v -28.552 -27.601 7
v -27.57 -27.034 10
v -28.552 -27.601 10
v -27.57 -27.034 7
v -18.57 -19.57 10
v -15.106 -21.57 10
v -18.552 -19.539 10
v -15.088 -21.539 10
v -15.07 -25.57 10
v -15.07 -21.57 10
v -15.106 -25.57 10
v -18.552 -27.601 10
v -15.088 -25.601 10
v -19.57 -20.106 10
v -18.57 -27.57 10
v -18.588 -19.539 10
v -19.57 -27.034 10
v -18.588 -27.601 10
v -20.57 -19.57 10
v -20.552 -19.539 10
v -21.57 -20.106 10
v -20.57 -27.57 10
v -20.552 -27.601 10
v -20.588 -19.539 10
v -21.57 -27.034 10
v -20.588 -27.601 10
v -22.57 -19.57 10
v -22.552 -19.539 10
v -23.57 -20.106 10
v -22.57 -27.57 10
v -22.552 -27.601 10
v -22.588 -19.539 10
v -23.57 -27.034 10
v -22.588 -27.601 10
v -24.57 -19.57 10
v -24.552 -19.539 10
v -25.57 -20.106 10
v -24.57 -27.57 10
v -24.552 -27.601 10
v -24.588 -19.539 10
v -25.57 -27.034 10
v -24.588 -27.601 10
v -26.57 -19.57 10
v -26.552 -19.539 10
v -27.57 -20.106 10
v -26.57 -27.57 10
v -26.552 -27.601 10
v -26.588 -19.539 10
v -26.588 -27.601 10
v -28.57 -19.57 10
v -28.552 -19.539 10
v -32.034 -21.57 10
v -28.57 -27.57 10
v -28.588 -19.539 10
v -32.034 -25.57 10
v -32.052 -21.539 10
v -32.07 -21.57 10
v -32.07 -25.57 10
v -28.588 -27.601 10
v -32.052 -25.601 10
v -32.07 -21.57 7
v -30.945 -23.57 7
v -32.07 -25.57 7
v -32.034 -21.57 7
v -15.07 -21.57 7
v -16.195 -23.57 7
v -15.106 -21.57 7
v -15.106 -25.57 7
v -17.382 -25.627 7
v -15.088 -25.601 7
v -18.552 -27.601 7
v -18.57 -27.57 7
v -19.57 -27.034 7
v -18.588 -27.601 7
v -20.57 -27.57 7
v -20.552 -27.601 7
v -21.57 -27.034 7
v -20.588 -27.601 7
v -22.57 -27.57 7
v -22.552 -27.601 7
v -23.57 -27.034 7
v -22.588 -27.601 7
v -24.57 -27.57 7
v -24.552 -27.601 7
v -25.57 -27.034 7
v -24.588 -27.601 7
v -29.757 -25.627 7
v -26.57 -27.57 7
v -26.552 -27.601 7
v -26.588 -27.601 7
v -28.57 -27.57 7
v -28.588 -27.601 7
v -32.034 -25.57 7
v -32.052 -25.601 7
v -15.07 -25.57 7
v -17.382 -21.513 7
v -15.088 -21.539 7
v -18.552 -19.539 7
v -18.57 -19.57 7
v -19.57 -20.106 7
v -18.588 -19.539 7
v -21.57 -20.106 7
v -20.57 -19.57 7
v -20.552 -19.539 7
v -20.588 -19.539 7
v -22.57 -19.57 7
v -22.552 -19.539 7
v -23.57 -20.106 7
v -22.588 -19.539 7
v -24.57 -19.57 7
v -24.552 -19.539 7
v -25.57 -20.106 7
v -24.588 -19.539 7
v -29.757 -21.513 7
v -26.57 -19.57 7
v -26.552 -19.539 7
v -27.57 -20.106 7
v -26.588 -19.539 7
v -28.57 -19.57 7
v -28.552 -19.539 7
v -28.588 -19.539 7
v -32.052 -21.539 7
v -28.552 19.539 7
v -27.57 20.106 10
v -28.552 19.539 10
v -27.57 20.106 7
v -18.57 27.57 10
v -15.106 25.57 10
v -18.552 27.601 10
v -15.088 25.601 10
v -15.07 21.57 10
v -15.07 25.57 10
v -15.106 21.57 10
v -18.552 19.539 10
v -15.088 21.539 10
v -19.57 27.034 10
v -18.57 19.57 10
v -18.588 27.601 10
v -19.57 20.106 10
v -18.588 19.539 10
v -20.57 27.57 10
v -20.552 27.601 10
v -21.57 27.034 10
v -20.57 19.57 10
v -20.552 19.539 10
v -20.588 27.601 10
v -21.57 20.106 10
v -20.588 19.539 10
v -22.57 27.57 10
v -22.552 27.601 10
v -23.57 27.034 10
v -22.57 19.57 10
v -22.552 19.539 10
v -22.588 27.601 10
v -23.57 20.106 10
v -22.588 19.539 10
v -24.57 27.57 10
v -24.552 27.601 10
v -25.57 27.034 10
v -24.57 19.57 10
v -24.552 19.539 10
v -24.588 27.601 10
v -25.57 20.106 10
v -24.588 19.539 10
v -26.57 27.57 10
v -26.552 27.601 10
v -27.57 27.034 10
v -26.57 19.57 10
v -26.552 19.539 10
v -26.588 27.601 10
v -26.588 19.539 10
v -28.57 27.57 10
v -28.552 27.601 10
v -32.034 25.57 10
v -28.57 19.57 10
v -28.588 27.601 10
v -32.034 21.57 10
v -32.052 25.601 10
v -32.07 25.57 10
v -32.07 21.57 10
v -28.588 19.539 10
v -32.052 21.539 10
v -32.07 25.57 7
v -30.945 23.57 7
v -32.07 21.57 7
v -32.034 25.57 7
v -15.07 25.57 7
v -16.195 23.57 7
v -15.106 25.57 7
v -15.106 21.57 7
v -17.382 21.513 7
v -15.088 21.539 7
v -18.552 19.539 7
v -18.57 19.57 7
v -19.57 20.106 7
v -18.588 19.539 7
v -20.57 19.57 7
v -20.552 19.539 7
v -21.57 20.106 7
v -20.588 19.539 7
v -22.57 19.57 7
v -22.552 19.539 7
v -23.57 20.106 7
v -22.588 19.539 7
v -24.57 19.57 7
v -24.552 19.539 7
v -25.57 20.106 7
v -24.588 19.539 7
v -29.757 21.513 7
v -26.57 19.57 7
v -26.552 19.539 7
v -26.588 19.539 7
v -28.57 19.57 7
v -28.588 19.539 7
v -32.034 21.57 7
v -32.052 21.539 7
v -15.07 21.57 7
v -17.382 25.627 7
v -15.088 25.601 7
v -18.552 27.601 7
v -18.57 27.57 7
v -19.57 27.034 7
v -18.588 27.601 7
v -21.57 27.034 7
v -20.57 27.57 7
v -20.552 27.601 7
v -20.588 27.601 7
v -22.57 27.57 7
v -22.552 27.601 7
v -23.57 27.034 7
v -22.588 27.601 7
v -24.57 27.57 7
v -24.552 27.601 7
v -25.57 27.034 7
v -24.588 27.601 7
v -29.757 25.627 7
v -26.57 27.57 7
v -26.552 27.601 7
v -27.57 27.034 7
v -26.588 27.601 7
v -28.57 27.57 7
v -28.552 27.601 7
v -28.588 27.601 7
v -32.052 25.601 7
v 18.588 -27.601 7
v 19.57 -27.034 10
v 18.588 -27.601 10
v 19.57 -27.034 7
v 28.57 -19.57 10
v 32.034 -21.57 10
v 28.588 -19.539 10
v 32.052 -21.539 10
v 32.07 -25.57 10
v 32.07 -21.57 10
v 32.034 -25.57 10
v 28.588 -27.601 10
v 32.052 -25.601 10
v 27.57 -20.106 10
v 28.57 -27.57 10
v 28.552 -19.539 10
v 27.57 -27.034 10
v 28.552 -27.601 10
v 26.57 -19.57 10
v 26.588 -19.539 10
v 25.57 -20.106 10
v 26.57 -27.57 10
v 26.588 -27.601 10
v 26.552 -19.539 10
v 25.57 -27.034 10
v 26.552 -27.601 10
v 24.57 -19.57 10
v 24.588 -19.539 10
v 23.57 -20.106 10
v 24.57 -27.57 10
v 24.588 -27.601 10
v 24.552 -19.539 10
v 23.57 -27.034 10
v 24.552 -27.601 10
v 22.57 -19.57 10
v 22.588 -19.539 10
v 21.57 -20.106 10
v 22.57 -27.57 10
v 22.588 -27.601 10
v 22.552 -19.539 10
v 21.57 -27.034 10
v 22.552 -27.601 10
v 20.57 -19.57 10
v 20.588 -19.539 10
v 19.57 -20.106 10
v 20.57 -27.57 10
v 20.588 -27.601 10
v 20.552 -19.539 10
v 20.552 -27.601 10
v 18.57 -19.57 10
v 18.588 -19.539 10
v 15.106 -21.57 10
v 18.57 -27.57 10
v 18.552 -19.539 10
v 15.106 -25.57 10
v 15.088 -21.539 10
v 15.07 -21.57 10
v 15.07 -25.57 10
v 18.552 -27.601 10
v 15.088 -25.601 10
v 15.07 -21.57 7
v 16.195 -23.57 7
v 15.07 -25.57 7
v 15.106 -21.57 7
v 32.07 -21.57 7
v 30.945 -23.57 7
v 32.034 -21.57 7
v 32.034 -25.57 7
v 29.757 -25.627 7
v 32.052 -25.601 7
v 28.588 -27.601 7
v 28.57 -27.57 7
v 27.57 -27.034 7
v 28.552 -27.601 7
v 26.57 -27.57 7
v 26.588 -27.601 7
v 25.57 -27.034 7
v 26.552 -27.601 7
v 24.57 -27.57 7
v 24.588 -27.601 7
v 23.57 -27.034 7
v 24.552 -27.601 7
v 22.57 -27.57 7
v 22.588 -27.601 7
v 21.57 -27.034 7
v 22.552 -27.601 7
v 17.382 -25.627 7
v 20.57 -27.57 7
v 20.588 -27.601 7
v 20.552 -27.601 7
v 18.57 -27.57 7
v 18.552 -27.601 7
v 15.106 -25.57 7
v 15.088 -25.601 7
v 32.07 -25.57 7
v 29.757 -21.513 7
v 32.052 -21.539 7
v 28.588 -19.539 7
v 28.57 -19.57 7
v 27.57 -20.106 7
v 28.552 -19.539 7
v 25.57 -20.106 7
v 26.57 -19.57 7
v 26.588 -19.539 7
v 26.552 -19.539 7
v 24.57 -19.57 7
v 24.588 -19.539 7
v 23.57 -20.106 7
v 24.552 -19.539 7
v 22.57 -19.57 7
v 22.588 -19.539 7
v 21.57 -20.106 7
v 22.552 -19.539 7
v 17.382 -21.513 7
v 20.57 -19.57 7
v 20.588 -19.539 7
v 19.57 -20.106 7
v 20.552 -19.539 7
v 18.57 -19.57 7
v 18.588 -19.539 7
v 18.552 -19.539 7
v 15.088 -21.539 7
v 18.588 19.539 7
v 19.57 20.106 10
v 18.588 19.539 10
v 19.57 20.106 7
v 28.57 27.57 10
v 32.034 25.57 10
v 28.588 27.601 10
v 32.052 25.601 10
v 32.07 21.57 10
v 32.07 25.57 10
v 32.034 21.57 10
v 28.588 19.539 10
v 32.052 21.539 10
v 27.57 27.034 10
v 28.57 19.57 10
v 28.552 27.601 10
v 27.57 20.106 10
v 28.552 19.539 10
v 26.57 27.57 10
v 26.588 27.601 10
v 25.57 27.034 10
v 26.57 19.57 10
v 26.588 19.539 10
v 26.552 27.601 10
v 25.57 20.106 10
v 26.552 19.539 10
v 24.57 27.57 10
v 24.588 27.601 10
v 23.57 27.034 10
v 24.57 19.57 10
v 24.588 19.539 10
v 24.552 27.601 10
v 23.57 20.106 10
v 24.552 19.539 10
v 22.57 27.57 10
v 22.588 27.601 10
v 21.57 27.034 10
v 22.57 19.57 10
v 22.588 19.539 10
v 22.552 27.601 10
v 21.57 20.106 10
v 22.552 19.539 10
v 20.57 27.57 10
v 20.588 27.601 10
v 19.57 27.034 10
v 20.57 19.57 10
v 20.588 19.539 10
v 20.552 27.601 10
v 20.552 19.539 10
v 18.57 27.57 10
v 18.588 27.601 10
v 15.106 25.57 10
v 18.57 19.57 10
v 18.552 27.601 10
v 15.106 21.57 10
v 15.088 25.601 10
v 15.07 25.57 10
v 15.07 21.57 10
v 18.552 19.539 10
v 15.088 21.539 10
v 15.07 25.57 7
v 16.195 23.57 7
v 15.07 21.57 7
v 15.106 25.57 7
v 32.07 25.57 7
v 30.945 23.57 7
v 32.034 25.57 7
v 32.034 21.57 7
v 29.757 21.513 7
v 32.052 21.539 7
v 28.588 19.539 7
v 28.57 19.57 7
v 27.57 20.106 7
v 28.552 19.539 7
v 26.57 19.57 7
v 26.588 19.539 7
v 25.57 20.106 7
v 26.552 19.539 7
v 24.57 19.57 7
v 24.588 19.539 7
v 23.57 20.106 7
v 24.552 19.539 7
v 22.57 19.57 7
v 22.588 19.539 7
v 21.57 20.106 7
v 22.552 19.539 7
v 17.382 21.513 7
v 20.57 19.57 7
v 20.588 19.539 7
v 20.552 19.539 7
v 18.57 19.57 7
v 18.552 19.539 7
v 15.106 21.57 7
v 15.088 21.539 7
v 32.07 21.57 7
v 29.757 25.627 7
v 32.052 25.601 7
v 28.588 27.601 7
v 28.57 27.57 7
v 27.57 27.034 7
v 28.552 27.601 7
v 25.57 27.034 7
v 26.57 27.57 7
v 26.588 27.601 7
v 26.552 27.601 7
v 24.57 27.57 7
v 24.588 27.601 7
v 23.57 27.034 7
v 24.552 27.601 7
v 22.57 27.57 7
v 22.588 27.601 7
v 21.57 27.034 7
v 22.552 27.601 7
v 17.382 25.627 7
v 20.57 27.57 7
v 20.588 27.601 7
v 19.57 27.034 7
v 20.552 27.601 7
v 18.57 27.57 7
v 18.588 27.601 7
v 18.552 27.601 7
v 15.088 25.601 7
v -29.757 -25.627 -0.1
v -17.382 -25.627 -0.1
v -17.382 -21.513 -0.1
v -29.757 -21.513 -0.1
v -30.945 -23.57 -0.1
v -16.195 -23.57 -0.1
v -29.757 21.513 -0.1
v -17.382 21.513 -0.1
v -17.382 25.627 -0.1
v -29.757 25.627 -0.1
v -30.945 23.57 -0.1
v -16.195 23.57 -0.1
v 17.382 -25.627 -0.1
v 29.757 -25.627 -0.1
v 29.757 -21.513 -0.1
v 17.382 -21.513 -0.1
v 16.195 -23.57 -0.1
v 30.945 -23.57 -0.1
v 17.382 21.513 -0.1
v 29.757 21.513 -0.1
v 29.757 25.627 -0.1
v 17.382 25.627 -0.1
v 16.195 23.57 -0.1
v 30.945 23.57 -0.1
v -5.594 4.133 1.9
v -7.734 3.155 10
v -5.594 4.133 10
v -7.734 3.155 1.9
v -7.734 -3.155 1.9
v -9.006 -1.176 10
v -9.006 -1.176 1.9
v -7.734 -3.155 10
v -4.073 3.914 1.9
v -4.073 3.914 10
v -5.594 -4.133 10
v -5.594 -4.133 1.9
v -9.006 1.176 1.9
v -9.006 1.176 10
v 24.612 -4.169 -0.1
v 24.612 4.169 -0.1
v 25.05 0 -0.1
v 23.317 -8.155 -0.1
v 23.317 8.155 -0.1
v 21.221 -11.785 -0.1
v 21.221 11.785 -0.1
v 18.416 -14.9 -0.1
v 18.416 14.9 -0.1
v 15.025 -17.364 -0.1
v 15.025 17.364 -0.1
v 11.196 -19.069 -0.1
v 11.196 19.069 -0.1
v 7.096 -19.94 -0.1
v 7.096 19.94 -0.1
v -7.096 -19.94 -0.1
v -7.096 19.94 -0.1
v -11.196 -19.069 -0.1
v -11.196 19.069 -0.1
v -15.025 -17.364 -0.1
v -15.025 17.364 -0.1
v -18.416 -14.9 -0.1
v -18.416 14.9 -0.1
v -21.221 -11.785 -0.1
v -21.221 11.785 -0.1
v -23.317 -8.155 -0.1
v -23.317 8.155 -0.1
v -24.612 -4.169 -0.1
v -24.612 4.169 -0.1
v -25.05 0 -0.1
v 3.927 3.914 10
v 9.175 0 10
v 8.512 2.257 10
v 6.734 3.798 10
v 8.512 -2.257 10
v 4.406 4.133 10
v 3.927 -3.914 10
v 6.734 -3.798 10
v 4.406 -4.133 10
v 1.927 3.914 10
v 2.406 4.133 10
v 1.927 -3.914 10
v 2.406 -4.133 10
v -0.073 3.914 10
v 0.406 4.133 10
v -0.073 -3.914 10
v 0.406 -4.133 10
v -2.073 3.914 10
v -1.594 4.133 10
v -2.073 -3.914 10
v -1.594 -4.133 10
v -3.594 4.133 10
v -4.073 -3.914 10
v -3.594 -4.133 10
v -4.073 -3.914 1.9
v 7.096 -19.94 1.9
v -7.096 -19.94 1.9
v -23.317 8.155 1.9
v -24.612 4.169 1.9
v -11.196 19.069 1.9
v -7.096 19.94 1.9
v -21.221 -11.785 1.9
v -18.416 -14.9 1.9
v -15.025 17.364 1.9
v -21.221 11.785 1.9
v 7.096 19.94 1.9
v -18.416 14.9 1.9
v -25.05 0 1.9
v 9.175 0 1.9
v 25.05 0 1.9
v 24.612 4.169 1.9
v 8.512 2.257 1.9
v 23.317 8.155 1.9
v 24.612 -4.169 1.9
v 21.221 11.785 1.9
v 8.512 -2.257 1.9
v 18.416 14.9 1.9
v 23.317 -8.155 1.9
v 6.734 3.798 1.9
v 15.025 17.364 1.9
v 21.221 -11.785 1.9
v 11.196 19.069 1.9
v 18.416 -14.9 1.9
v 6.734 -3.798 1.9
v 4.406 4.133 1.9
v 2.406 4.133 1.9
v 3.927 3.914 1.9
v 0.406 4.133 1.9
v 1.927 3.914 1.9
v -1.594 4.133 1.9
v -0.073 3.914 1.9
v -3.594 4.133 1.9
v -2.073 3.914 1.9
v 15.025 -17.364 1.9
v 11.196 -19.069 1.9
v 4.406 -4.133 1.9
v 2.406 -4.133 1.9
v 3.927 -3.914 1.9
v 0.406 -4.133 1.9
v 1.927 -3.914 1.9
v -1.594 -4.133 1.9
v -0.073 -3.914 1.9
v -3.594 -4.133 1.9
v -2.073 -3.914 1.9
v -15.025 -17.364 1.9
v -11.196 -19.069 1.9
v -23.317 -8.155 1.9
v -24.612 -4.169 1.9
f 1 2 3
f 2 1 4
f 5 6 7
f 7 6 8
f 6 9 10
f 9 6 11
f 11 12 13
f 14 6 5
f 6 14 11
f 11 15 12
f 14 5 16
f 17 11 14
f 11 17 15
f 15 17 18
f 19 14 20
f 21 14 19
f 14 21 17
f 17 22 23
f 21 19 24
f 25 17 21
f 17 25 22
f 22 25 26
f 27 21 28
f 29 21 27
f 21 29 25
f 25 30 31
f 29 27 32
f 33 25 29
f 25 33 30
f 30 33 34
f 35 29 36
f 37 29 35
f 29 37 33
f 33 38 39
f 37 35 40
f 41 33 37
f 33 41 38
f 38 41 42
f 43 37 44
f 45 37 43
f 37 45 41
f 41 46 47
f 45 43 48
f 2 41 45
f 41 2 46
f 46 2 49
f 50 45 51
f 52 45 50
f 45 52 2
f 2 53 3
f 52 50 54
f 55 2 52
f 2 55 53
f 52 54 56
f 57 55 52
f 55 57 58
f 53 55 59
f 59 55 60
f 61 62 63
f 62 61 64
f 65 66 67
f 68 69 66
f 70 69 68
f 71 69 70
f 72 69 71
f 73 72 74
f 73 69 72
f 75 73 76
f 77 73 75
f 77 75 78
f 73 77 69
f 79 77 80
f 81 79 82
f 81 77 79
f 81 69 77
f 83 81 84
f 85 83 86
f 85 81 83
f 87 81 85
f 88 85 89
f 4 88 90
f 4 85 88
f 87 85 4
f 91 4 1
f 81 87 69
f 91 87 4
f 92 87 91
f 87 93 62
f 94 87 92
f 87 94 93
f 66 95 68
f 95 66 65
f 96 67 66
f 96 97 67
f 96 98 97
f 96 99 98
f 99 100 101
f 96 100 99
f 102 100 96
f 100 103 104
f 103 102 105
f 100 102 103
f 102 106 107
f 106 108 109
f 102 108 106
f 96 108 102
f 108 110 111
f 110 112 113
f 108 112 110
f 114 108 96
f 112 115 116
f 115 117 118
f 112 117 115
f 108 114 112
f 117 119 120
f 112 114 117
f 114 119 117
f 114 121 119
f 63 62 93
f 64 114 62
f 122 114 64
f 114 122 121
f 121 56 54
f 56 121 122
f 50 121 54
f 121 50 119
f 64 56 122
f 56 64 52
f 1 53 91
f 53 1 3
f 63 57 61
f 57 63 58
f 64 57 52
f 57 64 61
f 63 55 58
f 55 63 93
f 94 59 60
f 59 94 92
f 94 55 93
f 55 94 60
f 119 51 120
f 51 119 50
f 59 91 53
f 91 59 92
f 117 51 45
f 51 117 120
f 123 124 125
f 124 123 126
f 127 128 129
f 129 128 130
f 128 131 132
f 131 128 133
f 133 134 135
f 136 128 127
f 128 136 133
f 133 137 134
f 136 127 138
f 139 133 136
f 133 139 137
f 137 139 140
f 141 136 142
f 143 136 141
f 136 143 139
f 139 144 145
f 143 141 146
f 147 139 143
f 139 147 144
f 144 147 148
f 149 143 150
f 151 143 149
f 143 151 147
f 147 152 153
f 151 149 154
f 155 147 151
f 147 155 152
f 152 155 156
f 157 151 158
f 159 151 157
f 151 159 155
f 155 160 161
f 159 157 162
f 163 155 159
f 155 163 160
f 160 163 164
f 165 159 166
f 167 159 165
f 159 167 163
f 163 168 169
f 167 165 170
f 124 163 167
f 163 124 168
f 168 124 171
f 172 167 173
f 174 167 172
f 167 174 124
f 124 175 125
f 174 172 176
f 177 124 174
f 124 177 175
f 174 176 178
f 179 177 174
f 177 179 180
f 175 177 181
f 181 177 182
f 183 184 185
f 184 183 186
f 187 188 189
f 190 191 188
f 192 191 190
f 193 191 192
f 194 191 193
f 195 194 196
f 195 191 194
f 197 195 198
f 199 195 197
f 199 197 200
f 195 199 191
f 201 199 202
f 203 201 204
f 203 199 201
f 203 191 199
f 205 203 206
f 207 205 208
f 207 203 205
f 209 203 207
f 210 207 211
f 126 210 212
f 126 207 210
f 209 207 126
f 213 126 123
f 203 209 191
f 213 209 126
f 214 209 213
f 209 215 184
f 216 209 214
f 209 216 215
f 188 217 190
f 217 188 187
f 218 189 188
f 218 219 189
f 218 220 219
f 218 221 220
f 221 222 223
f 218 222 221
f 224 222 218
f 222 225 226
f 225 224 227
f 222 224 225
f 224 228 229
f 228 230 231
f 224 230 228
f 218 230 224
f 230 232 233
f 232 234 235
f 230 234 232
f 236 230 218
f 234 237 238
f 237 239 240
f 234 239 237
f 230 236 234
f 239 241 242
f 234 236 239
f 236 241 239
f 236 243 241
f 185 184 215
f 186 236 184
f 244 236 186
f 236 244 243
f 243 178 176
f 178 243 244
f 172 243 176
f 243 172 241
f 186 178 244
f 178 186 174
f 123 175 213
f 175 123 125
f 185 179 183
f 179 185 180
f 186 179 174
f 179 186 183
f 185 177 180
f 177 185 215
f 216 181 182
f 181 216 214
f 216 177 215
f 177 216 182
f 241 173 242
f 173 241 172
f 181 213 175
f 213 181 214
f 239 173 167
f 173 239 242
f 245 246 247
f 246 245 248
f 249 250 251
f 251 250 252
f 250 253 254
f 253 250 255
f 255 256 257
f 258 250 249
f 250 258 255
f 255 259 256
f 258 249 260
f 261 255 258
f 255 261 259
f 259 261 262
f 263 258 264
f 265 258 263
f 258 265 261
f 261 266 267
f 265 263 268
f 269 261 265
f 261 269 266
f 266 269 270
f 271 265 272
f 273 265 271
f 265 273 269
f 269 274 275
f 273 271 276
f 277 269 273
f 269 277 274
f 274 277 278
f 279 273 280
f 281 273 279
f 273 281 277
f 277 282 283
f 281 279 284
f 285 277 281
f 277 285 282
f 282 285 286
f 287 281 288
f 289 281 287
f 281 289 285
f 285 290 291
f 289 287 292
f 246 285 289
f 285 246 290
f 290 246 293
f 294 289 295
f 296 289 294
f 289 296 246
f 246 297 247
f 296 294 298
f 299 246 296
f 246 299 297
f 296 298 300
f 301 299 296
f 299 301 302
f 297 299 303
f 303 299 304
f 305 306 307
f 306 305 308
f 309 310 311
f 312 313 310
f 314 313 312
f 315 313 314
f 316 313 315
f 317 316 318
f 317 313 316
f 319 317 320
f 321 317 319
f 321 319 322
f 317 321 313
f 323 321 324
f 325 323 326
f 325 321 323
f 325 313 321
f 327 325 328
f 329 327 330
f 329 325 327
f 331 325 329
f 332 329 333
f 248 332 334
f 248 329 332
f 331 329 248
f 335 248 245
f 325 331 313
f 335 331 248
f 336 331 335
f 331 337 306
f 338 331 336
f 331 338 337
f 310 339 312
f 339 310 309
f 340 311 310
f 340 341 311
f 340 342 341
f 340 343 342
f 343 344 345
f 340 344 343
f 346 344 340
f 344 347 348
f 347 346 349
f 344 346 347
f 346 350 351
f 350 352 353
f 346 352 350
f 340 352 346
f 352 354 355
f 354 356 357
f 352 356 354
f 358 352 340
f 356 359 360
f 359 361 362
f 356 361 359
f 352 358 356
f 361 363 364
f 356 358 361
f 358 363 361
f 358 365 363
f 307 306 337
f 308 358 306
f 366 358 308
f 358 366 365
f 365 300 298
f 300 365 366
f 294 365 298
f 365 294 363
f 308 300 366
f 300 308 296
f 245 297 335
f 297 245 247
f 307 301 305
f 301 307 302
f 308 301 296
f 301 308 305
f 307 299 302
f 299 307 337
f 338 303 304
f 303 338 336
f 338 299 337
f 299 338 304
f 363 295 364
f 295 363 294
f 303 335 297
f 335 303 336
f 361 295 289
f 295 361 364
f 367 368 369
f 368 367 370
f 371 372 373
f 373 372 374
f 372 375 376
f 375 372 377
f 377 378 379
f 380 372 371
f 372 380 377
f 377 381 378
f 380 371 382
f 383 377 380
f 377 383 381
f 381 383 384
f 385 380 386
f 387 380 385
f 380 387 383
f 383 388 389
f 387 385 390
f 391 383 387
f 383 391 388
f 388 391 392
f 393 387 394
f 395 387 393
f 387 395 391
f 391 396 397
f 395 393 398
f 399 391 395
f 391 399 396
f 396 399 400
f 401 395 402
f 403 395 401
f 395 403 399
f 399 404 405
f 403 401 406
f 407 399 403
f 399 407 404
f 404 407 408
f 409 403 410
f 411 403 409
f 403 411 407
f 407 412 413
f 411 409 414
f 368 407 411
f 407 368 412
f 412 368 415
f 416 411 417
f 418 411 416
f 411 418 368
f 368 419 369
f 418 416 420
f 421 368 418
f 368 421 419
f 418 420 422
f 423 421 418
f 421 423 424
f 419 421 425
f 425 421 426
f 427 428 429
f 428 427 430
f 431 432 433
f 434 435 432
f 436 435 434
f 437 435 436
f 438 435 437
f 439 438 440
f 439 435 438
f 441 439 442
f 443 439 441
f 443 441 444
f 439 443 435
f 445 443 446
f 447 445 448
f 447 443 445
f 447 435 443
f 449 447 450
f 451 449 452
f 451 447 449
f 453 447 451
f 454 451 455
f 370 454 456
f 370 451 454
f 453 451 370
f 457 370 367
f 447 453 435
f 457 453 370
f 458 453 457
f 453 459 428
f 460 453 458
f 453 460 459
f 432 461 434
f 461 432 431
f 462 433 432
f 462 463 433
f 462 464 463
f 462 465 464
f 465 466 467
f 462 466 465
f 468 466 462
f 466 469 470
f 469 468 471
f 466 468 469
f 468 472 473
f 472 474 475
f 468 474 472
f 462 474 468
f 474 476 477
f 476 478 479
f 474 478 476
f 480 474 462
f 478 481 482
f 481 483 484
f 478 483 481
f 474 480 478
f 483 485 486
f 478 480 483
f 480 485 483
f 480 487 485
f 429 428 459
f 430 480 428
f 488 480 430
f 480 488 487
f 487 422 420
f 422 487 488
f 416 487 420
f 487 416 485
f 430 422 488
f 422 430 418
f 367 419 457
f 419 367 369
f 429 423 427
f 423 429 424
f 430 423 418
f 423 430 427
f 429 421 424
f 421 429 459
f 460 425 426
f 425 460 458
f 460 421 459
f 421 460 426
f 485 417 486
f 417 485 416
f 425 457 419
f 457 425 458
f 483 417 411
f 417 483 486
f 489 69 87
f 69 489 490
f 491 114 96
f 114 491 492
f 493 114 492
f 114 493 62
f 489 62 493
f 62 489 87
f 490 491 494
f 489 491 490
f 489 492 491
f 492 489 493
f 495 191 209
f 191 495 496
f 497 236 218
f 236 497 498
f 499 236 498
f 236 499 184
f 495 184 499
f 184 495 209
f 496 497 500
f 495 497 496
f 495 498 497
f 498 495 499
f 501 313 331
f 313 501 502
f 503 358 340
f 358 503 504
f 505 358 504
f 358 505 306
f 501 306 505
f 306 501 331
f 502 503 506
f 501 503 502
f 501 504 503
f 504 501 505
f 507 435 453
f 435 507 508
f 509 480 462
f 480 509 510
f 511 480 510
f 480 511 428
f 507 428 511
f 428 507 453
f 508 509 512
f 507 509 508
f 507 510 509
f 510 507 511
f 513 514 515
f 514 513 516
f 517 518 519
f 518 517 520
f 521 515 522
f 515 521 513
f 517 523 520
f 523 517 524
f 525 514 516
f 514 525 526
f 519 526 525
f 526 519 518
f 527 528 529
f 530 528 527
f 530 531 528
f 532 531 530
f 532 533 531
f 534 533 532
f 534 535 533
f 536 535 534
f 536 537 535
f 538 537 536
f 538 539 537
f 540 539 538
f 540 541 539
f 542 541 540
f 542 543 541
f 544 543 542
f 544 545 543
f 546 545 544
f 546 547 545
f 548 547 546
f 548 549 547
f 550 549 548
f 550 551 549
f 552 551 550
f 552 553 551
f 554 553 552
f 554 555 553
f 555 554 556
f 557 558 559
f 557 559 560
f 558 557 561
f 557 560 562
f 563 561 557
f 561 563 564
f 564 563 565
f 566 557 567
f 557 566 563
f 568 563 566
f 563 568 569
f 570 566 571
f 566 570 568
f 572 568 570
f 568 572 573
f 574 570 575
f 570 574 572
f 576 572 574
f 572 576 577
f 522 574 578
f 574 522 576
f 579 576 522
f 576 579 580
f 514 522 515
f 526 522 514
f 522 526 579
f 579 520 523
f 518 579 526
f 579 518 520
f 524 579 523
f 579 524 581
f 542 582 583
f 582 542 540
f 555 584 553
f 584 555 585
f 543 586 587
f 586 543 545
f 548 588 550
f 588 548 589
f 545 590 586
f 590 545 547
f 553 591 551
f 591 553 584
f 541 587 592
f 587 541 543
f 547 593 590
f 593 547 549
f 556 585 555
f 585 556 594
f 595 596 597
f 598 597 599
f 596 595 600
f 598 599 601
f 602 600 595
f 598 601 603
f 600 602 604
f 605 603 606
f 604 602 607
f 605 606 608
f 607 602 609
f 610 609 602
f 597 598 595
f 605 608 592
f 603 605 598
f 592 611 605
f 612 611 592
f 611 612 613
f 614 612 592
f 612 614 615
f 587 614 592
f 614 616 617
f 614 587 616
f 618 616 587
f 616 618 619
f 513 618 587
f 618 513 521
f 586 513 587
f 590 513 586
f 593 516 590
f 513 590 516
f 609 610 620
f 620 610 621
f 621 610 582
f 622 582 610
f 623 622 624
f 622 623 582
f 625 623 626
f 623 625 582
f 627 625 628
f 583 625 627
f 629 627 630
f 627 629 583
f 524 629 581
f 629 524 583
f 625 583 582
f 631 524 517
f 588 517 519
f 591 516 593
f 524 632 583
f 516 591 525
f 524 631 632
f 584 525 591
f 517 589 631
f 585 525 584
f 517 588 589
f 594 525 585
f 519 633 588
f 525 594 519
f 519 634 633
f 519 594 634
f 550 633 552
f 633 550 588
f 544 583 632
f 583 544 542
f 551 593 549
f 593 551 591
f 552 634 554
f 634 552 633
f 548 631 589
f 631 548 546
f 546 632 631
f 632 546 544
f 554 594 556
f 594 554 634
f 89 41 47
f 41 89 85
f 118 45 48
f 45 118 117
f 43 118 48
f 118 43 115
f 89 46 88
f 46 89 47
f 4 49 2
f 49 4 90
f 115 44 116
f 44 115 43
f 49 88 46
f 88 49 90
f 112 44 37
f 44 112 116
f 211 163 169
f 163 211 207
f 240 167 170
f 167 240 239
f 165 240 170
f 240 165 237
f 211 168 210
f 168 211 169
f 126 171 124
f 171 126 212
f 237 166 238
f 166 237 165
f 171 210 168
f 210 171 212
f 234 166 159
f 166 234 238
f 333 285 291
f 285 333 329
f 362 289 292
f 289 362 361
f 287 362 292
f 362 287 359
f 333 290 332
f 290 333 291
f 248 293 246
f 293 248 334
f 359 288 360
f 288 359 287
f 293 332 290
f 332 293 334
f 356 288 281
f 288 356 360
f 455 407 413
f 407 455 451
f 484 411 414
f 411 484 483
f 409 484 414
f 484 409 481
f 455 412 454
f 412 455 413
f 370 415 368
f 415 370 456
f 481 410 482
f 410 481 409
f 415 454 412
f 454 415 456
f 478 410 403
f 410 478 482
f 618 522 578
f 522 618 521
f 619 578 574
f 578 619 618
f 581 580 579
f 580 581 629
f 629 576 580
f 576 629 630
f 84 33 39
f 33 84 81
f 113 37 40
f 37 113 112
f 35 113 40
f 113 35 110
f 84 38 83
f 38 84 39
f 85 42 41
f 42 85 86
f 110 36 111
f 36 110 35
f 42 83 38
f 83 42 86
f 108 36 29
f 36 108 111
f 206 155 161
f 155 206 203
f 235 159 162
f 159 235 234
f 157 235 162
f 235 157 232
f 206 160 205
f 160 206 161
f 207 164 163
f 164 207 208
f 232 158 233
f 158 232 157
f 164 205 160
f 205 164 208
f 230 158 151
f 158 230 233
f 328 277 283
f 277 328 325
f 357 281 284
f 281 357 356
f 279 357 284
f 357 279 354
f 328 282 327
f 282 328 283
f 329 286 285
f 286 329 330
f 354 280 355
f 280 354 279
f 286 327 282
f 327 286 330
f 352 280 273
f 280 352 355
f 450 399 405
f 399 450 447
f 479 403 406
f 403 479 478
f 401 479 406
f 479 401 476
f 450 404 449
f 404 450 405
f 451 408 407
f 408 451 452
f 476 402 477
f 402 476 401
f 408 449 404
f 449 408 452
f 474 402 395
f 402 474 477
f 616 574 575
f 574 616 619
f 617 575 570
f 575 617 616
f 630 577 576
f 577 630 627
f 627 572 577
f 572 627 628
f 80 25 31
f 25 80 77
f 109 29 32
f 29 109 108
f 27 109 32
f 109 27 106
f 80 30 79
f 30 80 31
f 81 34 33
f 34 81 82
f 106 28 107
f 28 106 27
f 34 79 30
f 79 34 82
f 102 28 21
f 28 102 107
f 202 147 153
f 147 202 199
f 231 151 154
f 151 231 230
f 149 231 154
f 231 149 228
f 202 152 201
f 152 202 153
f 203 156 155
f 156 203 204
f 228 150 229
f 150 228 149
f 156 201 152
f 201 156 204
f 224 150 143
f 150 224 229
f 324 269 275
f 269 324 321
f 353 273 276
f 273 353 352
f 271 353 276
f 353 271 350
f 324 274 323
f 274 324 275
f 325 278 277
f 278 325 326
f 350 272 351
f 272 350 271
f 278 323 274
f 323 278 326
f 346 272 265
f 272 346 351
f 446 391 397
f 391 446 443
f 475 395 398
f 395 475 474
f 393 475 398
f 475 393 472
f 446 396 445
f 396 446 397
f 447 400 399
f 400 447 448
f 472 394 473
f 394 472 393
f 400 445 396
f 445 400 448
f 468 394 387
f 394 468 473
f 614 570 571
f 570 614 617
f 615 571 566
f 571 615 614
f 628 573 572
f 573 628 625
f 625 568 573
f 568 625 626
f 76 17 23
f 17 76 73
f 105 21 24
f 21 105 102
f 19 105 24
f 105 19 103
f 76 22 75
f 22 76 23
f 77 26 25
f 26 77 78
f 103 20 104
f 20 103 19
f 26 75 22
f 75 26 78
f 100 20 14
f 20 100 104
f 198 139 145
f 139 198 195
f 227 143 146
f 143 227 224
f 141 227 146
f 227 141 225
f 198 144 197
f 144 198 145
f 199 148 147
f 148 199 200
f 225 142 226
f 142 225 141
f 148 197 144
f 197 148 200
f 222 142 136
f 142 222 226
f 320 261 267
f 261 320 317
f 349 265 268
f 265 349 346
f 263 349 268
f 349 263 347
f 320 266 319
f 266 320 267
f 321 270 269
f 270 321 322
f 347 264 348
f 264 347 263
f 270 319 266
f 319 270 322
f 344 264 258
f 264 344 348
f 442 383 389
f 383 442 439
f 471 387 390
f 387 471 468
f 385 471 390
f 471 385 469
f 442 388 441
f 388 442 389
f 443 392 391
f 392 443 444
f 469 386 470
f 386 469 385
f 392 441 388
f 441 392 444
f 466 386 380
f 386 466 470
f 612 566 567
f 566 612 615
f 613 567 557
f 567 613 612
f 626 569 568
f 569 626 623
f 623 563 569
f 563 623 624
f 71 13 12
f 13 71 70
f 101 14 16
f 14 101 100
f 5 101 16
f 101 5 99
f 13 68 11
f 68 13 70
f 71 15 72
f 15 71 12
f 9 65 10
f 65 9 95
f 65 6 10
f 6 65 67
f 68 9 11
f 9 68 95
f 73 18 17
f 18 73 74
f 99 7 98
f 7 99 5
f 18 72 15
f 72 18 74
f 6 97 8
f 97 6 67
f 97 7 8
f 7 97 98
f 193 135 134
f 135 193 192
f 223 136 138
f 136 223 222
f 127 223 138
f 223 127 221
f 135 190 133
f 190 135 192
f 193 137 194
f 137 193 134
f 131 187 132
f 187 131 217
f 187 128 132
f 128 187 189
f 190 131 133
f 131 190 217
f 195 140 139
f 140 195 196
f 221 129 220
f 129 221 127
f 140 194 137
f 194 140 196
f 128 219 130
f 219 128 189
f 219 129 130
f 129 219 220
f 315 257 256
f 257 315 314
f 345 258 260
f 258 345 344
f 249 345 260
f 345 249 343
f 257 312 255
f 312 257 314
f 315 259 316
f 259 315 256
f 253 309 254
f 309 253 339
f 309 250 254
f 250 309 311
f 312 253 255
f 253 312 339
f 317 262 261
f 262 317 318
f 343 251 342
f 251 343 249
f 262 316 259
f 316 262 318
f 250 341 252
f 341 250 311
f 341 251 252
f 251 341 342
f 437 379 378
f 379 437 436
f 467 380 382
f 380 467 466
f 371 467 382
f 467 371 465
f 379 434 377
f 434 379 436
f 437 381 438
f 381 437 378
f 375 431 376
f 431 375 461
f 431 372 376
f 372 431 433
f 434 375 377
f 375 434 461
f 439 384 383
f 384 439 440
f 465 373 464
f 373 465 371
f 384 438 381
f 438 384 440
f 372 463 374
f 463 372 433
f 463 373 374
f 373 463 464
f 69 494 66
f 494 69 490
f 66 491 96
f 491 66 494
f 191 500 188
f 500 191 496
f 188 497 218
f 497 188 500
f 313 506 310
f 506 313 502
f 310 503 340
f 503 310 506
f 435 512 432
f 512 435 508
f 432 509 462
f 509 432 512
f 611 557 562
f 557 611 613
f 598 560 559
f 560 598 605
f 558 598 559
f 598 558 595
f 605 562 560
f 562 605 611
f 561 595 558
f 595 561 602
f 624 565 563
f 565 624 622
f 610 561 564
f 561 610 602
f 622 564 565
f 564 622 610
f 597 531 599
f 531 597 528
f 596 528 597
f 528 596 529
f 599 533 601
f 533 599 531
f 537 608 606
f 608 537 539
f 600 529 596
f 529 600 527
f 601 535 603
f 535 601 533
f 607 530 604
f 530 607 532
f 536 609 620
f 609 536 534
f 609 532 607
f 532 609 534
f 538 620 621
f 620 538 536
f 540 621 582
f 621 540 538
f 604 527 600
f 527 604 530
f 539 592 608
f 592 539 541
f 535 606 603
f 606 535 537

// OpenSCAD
/**
 * NEMAMount.scad
 *
 * Produces the shape to be subtracted from a base to make a NEMA motor mount.
 *
 * @copyright  James Newton, 2013
 * @license    http://creativecommons.org/licenses/LGPL/2.1/
 * @license    http://creativecommons.org/licenses/by-sa/3.0/
 *
 * @see        http://www.thingiverse.com/thing:137829
 *
 *
**/


/* ******************************************************************************
 * Customizer parameters and rendering
 * ****************************************************************************** */

/* [Global] */


//The NEMA size. See: massmind.org/techref/io/stepper/nemasizes.htm
NEMA_Size = 23; // [8,11,14,17,23,34,42]

//Drive Shaft clearance hole: 0=no shaft, positive # = that size, negative number = standard NEMA shaft + abs(shaft) e.g. NEMA_Mount(17,shaft=-1) gives a 5+1=6mm shaft hole.
shaft = -1; // [-50:50]

//Pilot mounting indentation diameter: 0=no indentation, positive # = that diameter, negative # = standard NEMA pilot + abs(pilot)
pilot = -1; // [-20:90]

//height of the mounting and shaft holes. e.g. the thickness of your mounting plate
height = 10; // [1:100]

//Size of nut head. 0 for no nuts or an M size.
nut_size = 4; // [0:20]

//height of the nut head. 0 for no nuts or an M height.
nut_height =3; // [0:20]

//Distance the motor can slide in the mount.
adjust = 5; // [0:10]

//Show sample base with NEMA mount subtracted.
Show_Base =  0; // [0,1]

/* [Hidden] */


difference() {
	if (Show_Base==1)
		translate([-NEMA_Size*2,-NEMA_Size*2,0]) cube([NEMA_Size*4,NEMA_Size*4,height-.01]);
	NEMA_Mount (NEMA_Size, shaft, pilot, height, nut_size, nut_height, adjust);
	}


module NEMA_Mount (NEMA_Size, shaft=-1, pilot=-1, height, nut_size, nut_height, adjust=0) {
	for (r = [-adjust: 2: adjust]) 
		translate([r,0,0])
		Simple_NEMA_Mount (NEMA_Size, shaft, pilot, height, nut_size, nut_height, $fs=adjust/2+0.01);
	//drop the resolution to keep from swamping the system with CSG Products.
	}

module Simple_NEMA_Mount (NEMA_Size, shaft=-1, pilot=-1, height, nut_size, nut_height) {

	NEMA_Mount = lookup(NEMA_Size,[
		[ 8,15.4/2],
		[11,23.0/2],
		[14,26.0/2],
		[17,31.04/2],
		[23,47.14/2],
		[34,69.58/2],
		[42,88.90/2]
		]);

	NEMA_Bolt = lookup(NEMA_Size,[
		[ 8,2.0/2],
		[11,2.5/2],
		[14,3.0/2],
		[17,4.0/2],
		[23,4.75/2],
		[34,6.5/2],
		[42,7.15/2]
		]);

//the -.1's here are to ensure the hole breaks through the mounting plate
	translate([-NEMA_Mount,-NEMA_Mount,-.1]) cylinder(h=height-nut_height+.2, r=NEMA_Bolt);
	if (nut_height > 0) translate([-NEMA_Mount,-NEMA_Mount,height-nut_height]) nut(nut_size, nut_height);
	translate([-NEMA_Mount,+NEMA_Mount,-.1]) cylinder(h=height-nut_height+.2, r=NEMA_Bolt);
	if (nut_height > 0) translate([-NEMA_Mount,+NEMA_Mount,height-nut_height]) nut(nut_size, nut_height);
	translate([+NEMA_Mount,-NEMA_Mount,-.1]) cylinder(h=height-nut_height+.2, r=NEMA_Bolt);
	if (nut_height > 0) translate([+NEMA_Mount,-NEMA_Mount,height-nut_height]) nut(nut_size, nut_height);
	translate([+NEMA_Mount,+NEMA_Mount,-.1]) cylinder(h=height-nut_height+.2, r=NEMA_Bolt);
	if (nut_height > 0) translate([+NEMA_Mount,+NEMA_Mount,height-nut_height]) nut(nut_size, nut_height);
	if (shaft > 0) translate([0,0,-.1]) cylinder(h=height+.1, r=shaft);
	if (shaft < 0) translate([0,0,-.1]) cylinder(h=height+.1, r=-shaft + lookup(NEMA_Size,[
		[ 8,4.00/2],
		[11,5.00/2],
		[14,5.00/2],
		[17,5.00/2],
		[23,6.35/2],
		[34,9.50/2],
		[42,16.0/2]
		])
		);
	if (pilot > 0) cylinder(h=2, r=pilot);
	if (pilot < 0) translate([0,0,-.1]) cylinder(h=2, r=-pilot + lookup(NEMA_Size,[
		[ 8,15.00/2],
		[11,22.00/2],
		[14,22.00/2],
		[17,22.00/2],
		[23,38.10/2],
		[34,73.00/2],
		[42,73.0/2]
		])
		);
	};

module nut(nutSize,nutHeight) {
	//I have no idea if this actually produces the correct size.
	// need to check against:
	//http://www.boltdepot.com/fastener-information/Nuts-Washers/Metric-Nut-Dimensions.aspx
	for (r = [-60, 0, 60]) 
		translate([0,0,nutHeight/2]) rotate([0,0,r]) cube([nutSize*1.75, nutSize, nutHeight], true);
	}
